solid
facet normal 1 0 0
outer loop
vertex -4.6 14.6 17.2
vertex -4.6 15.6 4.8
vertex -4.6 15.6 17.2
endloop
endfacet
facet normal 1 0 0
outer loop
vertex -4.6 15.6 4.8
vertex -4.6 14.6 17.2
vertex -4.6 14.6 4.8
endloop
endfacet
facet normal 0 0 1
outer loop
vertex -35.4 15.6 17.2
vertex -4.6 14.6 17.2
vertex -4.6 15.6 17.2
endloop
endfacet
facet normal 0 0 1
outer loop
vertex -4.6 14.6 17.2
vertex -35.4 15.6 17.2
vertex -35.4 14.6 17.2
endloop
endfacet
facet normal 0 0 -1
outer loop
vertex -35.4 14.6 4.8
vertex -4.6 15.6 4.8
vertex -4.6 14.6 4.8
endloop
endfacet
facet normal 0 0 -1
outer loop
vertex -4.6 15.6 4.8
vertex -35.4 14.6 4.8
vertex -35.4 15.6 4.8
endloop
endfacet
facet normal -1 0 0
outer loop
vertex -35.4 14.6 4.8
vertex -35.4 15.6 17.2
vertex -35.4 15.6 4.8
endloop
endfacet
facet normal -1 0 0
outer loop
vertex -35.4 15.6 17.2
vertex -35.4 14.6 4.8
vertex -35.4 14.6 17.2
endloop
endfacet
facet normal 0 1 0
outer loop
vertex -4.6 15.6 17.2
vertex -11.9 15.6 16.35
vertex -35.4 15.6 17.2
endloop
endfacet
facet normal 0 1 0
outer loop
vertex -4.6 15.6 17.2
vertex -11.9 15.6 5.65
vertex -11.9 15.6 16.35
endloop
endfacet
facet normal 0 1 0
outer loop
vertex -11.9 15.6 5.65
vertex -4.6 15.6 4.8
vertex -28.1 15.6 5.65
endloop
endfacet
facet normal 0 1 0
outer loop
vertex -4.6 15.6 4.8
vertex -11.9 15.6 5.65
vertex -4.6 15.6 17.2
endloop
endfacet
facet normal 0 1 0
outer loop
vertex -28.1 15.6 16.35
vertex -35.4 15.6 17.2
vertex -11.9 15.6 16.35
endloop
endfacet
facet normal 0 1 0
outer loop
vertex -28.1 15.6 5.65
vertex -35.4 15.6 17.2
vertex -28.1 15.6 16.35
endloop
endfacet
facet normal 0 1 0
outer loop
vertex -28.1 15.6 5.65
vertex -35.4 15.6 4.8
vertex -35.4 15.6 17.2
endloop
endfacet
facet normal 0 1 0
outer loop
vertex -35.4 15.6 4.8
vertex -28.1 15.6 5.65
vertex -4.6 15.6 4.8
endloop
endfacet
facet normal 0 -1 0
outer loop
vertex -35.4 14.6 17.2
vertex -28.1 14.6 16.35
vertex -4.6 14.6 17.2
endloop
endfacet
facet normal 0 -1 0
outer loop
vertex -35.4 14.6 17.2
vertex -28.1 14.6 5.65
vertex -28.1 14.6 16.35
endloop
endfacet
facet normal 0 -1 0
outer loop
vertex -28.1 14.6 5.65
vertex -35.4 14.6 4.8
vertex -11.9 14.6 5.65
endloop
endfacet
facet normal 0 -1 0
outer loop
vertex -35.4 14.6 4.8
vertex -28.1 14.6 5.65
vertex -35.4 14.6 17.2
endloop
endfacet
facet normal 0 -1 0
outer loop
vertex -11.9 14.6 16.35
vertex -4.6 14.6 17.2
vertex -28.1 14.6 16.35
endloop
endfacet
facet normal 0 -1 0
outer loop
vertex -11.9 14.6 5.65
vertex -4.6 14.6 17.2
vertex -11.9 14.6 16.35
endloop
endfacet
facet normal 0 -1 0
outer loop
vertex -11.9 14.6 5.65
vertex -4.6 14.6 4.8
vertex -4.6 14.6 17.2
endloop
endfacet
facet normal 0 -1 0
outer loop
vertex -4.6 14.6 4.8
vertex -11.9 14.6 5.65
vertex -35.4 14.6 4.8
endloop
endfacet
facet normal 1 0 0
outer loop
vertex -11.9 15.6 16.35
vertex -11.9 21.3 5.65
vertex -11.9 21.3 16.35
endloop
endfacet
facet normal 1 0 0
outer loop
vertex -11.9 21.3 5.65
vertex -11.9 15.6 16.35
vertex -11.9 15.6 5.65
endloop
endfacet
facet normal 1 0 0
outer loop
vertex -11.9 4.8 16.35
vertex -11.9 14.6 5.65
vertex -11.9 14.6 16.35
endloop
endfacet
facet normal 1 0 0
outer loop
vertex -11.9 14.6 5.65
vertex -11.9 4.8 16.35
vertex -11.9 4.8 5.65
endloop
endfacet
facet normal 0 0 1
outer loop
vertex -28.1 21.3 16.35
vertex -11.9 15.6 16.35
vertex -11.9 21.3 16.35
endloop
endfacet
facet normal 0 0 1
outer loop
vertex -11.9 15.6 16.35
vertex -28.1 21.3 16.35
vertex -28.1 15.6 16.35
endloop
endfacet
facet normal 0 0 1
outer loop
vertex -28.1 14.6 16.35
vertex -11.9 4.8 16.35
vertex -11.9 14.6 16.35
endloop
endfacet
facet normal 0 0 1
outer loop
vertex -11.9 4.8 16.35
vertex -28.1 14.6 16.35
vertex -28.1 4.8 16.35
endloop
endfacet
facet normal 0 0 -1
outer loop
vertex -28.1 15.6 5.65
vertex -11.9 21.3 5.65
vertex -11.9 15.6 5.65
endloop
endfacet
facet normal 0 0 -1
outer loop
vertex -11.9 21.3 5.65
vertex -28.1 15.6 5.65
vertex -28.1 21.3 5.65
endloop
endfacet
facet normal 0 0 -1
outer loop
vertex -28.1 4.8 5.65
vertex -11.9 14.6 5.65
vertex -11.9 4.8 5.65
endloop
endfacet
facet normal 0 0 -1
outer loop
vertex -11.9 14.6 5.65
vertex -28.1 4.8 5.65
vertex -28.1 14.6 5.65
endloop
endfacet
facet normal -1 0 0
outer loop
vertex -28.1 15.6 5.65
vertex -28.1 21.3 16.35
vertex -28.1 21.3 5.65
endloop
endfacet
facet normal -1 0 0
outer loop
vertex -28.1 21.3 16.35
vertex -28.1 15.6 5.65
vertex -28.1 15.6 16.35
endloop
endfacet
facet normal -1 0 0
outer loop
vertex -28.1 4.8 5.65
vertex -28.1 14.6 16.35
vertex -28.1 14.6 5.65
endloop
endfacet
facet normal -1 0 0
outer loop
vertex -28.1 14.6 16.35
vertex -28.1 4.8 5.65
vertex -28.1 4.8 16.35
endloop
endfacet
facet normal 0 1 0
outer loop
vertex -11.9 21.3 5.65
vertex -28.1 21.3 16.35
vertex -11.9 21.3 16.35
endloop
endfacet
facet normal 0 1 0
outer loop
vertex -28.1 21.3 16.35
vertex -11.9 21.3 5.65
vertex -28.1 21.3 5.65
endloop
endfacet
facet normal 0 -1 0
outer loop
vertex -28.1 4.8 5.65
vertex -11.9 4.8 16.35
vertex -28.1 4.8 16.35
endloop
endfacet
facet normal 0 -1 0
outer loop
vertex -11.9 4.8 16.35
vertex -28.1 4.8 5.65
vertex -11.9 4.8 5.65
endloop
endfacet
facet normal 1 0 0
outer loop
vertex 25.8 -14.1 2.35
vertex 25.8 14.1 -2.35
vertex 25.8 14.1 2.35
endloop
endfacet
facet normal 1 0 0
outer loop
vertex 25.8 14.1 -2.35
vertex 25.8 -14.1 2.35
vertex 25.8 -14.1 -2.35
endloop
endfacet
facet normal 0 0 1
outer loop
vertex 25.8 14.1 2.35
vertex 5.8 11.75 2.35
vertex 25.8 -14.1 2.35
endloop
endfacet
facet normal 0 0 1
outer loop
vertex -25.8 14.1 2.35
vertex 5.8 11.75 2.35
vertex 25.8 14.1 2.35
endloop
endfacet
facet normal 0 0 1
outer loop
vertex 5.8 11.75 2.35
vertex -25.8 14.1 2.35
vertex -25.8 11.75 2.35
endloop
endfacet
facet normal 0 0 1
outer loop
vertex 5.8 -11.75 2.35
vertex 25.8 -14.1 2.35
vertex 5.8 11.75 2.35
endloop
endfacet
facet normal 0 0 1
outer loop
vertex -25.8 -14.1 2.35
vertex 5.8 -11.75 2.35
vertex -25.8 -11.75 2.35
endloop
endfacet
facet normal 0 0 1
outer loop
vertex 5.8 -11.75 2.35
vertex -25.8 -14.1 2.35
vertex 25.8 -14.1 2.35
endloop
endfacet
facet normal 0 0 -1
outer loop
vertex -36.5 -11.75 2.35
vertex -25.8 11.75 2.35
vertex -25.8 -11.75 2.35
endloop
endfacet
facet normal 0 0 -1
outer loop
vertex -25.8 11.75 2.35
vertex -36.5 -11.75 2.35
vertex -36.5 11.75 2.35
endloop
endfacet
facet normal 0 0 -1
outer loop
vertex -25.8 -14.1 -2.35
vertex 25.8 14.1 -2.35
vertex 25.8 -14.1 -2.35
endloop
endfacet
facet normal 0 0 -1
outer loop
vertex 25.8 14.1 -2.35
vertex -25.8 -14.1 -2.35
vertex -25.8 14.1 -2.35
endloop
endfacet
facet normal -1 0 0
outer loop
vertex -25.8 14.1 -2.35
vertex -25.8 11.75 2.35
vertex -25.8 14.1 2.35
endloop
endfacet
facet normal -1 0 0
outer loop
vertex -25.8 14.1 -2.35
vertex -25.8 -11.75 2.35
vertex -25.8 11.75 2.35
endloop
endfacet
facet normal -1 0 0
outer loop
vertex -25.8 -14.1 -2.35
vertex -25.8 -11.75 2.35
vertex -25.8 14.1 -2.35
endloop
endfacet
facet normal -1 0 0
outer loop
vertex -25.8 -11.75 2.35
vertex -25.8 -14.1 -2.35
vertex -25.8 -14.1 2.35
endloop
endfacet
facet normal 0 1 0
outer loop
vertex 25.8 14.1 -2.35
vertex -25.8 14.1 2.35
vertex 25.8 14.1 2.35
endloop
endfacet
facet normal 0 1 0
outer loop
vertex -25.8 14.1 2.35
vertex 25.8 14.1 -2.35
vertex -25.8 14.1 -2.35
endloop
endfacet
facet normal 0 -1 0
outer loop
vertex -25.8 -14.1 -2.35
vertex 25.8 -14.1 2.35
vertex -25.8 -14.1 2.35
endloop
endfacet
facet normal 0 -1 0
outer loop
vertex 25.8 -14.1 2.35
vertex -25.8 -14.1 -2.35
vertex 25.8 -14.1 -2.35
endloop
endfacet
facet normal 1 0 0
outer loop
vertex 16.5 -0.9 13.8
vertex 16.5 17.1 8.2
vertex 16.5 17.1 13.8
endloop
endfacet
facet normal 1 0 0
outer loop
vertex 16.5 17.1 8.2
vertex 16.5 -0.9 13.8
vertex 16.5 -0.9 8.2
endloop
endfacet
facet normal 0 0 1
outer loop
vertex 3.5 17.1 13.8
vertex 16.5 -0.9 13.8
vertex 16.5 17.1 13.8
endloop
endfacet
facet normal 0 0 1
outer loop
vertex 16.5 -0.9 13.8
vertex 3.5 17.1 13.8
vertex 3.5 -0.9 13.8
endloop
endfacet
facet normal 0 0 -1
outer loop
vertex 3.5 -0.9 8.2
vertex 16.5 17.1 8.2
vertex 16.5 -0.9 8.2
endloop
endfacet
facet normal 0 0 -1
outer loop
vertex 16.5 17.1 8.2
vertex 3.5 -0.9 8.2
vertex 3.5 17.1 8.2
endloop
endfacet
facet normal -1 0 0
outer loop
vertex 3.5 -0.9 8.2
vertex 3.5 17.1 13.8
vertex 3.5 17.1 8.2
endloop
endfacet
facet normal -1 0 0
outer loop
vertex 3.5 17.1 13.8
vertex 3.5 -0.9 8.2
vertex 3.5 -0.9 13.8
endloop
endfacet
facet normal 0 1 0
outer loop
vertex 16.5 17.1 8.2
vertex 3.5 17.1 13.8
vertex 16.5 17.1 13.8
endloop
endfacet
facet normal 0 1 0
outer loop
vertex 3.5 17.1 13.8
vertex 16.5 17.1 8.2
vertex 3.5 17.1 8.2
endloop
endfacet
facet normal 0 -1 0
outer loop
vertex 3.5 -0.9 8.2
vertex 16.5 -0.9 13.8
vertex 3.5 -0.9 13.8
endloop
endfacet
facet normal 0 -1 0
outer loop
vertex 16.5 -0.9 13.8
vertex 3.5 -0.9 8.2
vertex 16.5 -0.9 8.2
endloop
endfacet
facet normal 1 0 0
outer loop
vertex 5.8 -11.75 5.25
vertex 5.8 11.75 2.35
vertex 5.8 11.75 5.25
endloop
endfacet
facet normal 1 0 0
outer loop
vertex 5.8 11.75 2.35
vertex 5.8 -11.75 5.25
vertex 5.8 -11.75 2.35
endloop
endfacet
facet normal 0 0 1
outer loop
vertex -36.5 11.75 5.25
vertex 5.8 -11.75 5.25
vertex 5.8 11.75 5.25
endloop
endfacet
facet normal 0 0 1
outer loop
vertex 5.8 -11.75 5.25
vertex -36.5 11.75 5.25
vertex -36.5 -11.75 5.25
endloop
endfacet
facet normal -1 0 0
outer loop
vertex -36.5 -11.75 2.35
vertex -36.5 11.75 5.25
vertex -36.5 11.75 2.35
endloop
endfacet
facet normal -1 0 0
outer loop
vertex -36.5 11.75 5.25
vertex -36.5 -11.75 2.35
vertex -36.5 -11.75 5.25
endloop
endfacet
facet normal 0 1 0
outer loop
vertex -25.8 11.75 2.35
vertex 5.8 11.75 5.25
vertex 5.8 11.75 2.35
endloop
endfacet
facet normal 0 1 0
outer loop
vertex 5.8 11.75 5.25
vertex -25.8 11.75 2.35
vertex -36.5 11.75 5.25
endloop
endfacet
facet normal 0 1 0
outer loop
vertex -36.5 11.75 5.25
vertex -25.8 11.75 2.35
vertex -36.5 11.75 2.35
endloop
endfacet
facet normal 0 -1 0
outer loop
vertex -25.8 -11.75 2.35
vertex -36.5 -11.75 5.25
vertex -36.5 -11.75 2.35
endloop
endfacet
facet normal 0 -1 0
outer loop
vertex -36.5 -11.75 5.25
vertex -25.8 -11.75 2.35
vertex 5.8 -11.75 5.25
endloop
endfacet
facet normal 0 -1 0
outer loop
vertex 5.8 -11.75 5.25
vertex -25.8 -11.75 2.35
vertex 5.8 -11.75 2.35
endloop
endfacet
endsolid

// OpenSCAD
// Author: Peter Jensen

x = 0; y = 1; z = 2;

esp32Dims           = [51.6, 28.2, 4.7];
vgaPlateDims        = [30.8, 1.0, 12.4];
vgaConnectorDims    = [16.2, 16.5, 10.7];
vgaConnectorOffsets = [0, 6.2 - vgaConnectorDims[y]/2, 0];
vgaOffsets          = [-20.0, esp32Dims[y]/2+vgaPlateDims[y], 11.0];
usbDims             = [13.0, 18.0, 5.6];
usbOffsets          = [10.0, esp32Dims[y]/2 - usbDims[y]/2 + 3, vgaOffsets[z]];
sdDims              = [42.3, 23.5, 2.9];
sdOffsets           = [esp32Dims[x]/2 - sdDims[x]/2 - 20.0, 0, sdDims[z]/2 + esp32Dims[z]/2];

module esp32() {
  cube(esp32Dims, center=true);
}

module vga() {
  translate(vgaOffsets) {
    cube(vgaPlateDims, center=true);
    translate(vgaConnectorOffsets)
      cube(vgaConnectorDims, center=true);
  }
}

module usb() {
  translate(usbOffsets)
    cube(usbDims, center=true);
}

module sd() {
  translate(sdOffsets)
    cube(sdDims, center=true);
}

module components() {
  esp32();
  vga();
  usb();
  sd();
}

module main() {
  components();
}

main();
